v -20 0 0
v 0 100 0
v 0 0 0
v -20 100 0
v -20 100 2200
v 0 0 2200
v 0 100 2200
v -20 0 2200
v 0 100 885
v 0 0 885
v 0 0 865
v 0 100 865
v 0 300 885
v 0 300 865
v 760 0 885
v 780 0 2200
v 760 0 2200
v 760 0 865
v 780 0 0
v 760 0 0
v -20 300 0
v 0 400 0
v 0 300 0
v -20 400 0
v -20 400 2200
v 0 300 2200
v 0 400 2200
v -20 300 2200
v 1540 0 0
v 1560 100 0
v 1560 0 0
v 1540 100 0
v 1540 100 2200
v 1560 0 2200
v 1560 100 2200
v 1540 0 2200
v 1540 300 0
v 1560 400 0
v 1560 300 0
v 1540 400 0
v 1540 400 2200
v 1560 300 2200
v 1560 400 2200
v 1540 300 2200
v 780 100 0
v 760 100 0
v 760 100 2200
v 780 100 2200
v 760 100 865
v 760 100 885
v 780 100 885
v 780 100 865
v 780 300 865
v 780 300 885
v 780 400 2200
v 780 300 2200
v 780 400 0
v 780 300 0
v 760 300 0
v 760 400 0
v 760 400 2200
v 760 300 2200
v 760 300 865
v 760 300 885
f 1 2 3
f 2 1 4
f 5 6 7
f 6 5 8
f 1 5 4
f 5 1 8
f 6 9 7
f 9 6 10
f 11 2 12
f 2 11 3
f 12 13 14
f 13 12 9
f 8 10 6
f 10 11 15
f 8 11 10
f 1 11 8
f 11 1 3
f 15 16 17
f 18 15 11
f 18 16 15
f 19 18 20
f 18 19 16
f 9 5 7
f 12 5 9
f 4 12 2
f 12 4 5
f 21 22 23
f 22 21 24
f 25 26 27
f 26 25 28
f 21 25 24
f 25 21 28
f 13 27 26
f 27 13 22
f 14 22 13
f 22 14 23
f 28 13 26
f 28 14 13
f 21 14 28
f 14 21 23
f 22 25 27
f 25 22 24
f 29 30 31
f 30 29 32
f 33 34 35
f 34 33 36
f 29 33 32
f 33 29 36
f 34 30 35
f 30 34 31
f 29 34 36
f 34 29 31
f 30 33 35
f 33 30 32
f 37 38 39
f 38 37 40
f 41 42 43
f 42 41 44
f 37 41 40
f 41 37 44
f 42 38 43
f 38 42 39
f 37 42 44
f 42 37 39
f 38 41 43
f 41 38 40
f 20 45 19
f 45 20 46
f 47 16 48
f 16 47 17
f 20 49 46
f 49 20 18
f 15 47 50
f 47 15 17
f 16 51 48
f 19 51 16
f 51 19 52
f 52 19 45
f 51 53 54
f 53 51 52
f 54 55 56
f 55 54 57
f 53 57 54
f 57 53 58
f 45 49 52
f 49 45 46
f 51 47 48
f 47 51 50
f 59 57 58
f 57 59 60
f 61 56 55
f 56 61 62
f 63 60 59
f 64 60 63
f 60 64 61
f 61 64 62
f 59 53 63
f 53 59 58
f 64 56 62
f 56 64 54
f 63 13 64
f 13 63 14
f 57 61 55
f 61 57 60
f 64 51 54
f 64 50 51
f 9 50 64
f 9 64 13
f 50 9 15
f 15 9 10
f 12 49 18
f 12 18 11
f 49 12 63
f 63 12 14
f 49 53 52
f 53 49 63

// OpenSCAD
width = 1560;
height = 2200;
depth = 300;

module plank(length) {
    cube([length, 100, 20]);
}

module vertical(length) {
    rotate([0,-90,0]) plank(length); 
}
module horizontal(height) {
    translate([0,0,height])cube([width/2, depth, 20]);
}

translate([0,0,0]) vertical(2200);
translate([0,depth,0]) vertical(2200);
translate([width,0,0]) vertical(2200);
translate([width,depth,0]) vertical(2200);
translate([width/2,0,0]) vertical(2200);
translate([width/2,depth,0]) vertical(2200);
horizontal(865);
